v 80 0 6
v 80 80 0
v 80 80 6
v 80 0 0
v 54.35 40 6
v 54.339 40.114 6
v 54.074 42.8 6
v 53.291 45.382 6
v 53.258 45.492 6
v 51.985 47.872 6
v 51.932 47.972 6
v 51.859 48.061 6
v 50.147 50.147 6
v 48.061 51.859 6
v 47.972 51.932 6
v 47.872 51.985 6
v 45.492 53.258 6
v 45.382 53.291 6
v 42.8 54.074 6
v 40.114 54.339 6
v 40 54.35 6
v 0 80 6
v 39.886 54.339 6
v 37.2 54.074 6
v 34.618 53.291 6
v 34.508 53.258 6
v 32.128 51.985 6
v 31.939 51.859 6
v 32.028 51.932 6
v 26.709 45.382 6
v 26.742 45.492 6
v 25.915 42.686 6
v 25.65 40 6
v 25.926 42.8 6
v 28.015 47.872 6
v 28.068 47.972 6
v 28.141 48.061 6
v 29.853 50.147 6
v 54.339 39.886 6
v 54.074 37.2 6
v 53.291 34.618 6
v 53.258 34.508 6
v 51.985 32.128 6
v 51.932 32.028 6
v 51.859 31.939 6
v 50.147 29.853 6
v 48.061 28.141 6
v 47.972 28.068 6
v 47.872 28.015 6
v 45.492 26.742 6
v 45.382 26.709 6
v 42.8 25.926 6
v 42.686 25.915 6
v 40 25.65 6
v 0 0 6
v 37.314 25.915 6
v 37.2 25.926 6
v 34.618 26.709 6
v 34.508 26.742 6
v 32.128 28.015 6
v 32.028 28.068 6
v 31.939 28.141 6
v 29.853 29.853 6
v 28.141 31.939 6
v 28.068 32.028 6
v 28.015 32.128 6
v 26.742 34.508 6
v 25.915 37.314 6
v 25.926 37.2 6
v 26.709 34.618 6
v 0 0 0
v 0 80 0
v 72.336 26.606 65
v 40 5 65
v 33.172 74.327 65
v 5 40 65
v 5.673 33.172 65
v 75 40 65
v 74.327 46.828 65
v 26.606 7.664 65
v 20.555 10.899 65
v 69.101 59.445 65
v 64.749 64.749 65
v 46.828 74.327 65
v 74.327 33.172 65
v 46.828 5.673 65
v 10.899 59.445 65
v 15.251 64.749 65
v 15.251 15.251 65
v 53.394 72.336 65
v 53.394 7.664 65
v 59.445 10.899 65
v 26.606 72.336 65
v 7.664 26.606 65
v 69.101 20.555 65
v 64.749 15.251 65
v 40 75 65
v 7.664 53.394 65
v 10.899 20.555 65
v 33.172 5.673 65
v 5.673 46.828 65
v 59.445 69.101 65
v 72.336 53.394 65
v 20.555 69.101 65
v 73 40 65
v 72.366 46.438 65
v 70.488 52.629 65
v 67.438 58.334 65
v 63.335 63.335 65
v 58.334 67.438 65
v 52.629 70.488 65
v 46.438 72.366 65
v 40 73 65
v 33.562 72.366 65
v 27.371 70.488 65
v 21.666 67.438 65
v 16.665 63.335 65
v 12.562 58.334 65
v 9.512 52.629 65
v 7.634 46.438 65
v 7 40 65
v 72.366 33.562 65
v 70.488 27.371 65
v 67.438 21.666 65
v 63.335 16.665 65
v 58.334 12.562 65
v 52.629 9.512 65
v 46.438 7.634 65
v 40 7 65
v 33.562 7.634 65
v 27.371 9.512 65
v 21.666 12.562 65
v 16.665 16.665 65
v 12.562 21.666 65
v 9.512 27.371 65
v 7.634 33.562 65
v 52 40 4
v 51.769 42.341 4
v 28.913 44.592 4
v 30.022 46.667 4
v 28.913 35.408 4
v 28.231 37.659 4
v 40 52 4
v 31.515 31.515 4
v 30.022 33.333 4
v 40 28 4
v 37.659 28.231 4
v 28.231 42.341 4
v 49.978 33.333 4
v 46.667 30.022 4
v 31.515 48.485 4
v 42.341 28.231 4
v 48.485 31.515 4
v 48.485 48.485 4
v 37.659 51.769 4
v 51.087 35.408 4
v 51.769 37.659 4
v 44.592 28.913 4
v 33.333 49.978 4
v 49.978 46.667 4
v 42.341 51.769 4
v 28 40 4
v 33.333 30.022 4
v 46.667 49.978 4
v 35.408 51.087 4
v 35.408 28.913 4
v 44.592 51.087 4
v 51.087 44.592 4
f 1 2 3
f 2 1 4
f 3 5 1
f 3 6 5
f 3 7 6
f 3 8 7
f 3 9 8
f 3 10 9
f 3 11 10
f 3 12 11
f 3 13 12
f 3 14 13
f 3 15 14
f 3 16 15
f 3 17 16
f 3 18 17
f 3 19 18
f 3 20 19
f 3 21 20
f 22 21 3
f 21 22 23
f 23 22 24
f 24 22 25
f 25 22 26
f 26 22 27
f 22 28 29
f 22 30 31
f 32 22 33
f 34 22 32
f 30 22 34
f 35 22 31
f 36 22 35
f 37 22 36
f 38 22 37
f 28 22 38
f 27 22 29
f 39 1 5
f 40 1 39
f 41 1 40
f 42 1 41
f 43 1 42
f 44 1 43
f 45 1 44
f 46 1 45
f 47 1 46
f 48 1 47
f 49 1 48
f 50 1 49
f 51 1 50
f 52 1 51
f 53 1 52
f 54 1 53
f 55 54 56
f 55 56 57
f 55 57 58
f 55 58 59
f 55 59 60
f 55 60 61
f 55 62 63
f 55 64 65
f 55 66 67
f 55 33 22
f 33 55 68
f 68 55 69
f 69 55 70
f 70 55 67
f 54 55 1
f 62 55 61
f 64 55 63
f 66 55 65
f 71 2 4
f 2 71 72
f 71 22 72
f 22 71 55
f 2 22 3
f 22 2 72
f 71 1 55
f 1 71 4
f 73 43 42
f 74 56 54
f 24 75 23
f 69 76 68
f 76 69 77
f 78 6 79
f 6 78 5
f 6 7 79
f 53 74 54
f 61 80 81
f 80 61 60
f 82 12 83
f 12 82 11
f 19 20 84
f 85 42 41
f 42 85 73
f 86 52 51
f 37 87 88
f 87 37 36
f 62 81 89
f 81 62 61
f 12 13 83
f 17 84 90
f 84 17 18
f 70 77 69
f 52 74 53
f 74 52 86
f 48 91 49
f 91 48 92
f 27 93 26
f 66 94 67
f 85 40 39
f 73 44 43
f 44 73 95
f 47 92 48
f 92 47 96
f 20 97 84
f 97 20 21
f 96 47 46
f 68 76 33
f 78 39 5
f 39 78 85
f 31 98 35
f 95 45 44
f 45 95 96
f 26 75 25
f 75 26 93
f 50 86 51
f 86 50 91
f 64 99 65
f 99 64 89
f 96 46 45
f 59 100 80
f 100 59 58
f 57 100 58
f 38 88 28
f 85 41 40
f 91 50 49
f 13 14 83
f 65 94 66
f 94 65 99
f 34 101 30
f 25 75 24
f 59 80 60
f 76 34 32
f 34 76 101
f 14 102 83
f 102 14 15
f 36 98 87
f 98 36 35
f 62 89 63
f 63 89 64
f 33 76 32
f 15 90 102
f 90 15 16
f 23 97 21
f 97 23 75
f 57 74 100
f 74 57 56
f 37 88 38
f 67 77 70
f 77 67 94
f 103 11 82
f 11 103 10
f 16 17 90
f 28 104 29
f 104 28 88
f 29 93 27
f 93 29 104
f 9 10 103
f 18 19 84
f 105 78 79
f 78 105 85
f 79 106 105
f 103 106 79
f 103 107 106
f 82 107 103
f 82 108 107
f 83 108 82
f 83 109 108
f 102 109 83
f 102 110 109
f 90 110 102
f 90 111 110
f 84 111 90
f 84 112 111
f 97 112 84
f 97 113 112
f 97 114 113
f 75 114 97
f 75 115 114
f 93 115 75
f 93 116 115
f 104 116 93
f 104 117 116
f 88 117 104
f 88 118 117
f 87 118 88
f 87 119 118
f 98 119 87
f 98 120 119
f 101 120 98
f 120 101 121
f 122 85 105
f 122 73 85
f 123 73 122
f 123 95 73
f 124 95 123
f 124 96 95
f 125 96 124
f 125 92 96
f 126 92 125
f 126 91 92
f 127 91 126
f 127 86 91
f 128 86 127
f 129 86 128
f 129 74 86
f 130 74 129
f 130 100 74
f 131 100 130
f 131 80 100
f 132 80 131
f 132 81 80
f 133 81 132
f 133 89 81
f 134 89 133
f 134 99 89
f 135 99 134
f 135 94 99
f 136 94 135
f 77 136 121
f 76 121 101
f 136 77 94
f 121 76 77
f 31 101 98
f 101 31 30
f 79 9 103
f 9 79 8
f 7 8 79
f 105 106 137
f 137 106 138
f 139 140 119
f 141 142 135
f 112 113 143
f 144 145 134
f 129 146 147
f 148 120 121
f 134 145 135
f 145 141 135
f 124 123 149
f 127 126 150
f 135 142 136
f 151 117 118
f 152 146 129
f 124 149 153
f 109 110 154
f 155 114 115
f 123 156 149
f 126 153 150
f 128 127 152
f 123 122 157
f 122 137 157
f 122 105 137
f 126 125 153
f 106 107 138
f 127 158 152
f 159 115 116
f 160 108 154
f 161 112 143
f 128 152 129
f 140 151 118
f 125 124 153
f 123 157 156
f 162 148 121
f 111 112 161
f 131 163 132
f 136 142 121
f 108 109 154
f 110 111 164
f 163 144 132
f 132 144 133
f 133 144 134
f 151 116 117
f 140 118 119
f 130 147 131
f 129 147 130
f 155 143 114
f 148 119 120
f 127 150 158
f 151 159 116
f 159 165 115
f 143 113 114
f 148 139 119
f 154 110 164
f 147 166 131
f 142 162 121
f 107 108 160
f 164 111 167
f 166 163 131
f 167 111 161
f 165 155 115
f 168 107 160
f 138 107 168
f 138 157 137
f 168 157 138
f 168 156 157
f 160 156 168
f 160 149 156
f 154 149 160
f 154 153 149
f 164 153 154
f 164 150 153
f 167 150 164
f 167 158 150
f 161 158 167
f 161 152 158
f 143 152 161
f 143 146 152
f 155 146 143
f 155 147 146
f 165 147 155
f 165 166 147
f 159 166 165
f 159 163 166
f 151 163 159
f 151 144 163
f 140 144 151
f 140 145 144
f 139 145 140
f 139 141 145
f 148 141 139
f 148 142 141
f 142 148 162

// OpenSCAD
$fn = 32;

// ----------------------------------------------------------------------
// Hopper: funnel with square flange
// ----------------------------------------------------------------------

// --- parameters (mm) ---
fl = 80;                  // flange side, X and Y
fl_t = 6;                 // flange thickness
cone_h = 60;              // cone height above the flange
top_d = 70;               // cone mouth diameter
bot_d = 28;               // cone spout diameter
wall = 2;                 // cone wall thickness

bore_d = bot_d - 2 * wall;  // spout bore diameter
total_h = fl_t + cone_h - 1;  // overall height

difference() {
  union() {
    cube([fl, fl, fl_t]);
    translate([fl / 2, fl / 2, fl_t - 1])
      cylinder(h = cone_h, d1 = bot_d, d2 = top_d);
  }
  translate([fl / 2, fl / 2, fl_t - 2])
    cylinder(h = cone_h + 1, d1 = bore_d, d2 = top_d - 2 * wall);
}
